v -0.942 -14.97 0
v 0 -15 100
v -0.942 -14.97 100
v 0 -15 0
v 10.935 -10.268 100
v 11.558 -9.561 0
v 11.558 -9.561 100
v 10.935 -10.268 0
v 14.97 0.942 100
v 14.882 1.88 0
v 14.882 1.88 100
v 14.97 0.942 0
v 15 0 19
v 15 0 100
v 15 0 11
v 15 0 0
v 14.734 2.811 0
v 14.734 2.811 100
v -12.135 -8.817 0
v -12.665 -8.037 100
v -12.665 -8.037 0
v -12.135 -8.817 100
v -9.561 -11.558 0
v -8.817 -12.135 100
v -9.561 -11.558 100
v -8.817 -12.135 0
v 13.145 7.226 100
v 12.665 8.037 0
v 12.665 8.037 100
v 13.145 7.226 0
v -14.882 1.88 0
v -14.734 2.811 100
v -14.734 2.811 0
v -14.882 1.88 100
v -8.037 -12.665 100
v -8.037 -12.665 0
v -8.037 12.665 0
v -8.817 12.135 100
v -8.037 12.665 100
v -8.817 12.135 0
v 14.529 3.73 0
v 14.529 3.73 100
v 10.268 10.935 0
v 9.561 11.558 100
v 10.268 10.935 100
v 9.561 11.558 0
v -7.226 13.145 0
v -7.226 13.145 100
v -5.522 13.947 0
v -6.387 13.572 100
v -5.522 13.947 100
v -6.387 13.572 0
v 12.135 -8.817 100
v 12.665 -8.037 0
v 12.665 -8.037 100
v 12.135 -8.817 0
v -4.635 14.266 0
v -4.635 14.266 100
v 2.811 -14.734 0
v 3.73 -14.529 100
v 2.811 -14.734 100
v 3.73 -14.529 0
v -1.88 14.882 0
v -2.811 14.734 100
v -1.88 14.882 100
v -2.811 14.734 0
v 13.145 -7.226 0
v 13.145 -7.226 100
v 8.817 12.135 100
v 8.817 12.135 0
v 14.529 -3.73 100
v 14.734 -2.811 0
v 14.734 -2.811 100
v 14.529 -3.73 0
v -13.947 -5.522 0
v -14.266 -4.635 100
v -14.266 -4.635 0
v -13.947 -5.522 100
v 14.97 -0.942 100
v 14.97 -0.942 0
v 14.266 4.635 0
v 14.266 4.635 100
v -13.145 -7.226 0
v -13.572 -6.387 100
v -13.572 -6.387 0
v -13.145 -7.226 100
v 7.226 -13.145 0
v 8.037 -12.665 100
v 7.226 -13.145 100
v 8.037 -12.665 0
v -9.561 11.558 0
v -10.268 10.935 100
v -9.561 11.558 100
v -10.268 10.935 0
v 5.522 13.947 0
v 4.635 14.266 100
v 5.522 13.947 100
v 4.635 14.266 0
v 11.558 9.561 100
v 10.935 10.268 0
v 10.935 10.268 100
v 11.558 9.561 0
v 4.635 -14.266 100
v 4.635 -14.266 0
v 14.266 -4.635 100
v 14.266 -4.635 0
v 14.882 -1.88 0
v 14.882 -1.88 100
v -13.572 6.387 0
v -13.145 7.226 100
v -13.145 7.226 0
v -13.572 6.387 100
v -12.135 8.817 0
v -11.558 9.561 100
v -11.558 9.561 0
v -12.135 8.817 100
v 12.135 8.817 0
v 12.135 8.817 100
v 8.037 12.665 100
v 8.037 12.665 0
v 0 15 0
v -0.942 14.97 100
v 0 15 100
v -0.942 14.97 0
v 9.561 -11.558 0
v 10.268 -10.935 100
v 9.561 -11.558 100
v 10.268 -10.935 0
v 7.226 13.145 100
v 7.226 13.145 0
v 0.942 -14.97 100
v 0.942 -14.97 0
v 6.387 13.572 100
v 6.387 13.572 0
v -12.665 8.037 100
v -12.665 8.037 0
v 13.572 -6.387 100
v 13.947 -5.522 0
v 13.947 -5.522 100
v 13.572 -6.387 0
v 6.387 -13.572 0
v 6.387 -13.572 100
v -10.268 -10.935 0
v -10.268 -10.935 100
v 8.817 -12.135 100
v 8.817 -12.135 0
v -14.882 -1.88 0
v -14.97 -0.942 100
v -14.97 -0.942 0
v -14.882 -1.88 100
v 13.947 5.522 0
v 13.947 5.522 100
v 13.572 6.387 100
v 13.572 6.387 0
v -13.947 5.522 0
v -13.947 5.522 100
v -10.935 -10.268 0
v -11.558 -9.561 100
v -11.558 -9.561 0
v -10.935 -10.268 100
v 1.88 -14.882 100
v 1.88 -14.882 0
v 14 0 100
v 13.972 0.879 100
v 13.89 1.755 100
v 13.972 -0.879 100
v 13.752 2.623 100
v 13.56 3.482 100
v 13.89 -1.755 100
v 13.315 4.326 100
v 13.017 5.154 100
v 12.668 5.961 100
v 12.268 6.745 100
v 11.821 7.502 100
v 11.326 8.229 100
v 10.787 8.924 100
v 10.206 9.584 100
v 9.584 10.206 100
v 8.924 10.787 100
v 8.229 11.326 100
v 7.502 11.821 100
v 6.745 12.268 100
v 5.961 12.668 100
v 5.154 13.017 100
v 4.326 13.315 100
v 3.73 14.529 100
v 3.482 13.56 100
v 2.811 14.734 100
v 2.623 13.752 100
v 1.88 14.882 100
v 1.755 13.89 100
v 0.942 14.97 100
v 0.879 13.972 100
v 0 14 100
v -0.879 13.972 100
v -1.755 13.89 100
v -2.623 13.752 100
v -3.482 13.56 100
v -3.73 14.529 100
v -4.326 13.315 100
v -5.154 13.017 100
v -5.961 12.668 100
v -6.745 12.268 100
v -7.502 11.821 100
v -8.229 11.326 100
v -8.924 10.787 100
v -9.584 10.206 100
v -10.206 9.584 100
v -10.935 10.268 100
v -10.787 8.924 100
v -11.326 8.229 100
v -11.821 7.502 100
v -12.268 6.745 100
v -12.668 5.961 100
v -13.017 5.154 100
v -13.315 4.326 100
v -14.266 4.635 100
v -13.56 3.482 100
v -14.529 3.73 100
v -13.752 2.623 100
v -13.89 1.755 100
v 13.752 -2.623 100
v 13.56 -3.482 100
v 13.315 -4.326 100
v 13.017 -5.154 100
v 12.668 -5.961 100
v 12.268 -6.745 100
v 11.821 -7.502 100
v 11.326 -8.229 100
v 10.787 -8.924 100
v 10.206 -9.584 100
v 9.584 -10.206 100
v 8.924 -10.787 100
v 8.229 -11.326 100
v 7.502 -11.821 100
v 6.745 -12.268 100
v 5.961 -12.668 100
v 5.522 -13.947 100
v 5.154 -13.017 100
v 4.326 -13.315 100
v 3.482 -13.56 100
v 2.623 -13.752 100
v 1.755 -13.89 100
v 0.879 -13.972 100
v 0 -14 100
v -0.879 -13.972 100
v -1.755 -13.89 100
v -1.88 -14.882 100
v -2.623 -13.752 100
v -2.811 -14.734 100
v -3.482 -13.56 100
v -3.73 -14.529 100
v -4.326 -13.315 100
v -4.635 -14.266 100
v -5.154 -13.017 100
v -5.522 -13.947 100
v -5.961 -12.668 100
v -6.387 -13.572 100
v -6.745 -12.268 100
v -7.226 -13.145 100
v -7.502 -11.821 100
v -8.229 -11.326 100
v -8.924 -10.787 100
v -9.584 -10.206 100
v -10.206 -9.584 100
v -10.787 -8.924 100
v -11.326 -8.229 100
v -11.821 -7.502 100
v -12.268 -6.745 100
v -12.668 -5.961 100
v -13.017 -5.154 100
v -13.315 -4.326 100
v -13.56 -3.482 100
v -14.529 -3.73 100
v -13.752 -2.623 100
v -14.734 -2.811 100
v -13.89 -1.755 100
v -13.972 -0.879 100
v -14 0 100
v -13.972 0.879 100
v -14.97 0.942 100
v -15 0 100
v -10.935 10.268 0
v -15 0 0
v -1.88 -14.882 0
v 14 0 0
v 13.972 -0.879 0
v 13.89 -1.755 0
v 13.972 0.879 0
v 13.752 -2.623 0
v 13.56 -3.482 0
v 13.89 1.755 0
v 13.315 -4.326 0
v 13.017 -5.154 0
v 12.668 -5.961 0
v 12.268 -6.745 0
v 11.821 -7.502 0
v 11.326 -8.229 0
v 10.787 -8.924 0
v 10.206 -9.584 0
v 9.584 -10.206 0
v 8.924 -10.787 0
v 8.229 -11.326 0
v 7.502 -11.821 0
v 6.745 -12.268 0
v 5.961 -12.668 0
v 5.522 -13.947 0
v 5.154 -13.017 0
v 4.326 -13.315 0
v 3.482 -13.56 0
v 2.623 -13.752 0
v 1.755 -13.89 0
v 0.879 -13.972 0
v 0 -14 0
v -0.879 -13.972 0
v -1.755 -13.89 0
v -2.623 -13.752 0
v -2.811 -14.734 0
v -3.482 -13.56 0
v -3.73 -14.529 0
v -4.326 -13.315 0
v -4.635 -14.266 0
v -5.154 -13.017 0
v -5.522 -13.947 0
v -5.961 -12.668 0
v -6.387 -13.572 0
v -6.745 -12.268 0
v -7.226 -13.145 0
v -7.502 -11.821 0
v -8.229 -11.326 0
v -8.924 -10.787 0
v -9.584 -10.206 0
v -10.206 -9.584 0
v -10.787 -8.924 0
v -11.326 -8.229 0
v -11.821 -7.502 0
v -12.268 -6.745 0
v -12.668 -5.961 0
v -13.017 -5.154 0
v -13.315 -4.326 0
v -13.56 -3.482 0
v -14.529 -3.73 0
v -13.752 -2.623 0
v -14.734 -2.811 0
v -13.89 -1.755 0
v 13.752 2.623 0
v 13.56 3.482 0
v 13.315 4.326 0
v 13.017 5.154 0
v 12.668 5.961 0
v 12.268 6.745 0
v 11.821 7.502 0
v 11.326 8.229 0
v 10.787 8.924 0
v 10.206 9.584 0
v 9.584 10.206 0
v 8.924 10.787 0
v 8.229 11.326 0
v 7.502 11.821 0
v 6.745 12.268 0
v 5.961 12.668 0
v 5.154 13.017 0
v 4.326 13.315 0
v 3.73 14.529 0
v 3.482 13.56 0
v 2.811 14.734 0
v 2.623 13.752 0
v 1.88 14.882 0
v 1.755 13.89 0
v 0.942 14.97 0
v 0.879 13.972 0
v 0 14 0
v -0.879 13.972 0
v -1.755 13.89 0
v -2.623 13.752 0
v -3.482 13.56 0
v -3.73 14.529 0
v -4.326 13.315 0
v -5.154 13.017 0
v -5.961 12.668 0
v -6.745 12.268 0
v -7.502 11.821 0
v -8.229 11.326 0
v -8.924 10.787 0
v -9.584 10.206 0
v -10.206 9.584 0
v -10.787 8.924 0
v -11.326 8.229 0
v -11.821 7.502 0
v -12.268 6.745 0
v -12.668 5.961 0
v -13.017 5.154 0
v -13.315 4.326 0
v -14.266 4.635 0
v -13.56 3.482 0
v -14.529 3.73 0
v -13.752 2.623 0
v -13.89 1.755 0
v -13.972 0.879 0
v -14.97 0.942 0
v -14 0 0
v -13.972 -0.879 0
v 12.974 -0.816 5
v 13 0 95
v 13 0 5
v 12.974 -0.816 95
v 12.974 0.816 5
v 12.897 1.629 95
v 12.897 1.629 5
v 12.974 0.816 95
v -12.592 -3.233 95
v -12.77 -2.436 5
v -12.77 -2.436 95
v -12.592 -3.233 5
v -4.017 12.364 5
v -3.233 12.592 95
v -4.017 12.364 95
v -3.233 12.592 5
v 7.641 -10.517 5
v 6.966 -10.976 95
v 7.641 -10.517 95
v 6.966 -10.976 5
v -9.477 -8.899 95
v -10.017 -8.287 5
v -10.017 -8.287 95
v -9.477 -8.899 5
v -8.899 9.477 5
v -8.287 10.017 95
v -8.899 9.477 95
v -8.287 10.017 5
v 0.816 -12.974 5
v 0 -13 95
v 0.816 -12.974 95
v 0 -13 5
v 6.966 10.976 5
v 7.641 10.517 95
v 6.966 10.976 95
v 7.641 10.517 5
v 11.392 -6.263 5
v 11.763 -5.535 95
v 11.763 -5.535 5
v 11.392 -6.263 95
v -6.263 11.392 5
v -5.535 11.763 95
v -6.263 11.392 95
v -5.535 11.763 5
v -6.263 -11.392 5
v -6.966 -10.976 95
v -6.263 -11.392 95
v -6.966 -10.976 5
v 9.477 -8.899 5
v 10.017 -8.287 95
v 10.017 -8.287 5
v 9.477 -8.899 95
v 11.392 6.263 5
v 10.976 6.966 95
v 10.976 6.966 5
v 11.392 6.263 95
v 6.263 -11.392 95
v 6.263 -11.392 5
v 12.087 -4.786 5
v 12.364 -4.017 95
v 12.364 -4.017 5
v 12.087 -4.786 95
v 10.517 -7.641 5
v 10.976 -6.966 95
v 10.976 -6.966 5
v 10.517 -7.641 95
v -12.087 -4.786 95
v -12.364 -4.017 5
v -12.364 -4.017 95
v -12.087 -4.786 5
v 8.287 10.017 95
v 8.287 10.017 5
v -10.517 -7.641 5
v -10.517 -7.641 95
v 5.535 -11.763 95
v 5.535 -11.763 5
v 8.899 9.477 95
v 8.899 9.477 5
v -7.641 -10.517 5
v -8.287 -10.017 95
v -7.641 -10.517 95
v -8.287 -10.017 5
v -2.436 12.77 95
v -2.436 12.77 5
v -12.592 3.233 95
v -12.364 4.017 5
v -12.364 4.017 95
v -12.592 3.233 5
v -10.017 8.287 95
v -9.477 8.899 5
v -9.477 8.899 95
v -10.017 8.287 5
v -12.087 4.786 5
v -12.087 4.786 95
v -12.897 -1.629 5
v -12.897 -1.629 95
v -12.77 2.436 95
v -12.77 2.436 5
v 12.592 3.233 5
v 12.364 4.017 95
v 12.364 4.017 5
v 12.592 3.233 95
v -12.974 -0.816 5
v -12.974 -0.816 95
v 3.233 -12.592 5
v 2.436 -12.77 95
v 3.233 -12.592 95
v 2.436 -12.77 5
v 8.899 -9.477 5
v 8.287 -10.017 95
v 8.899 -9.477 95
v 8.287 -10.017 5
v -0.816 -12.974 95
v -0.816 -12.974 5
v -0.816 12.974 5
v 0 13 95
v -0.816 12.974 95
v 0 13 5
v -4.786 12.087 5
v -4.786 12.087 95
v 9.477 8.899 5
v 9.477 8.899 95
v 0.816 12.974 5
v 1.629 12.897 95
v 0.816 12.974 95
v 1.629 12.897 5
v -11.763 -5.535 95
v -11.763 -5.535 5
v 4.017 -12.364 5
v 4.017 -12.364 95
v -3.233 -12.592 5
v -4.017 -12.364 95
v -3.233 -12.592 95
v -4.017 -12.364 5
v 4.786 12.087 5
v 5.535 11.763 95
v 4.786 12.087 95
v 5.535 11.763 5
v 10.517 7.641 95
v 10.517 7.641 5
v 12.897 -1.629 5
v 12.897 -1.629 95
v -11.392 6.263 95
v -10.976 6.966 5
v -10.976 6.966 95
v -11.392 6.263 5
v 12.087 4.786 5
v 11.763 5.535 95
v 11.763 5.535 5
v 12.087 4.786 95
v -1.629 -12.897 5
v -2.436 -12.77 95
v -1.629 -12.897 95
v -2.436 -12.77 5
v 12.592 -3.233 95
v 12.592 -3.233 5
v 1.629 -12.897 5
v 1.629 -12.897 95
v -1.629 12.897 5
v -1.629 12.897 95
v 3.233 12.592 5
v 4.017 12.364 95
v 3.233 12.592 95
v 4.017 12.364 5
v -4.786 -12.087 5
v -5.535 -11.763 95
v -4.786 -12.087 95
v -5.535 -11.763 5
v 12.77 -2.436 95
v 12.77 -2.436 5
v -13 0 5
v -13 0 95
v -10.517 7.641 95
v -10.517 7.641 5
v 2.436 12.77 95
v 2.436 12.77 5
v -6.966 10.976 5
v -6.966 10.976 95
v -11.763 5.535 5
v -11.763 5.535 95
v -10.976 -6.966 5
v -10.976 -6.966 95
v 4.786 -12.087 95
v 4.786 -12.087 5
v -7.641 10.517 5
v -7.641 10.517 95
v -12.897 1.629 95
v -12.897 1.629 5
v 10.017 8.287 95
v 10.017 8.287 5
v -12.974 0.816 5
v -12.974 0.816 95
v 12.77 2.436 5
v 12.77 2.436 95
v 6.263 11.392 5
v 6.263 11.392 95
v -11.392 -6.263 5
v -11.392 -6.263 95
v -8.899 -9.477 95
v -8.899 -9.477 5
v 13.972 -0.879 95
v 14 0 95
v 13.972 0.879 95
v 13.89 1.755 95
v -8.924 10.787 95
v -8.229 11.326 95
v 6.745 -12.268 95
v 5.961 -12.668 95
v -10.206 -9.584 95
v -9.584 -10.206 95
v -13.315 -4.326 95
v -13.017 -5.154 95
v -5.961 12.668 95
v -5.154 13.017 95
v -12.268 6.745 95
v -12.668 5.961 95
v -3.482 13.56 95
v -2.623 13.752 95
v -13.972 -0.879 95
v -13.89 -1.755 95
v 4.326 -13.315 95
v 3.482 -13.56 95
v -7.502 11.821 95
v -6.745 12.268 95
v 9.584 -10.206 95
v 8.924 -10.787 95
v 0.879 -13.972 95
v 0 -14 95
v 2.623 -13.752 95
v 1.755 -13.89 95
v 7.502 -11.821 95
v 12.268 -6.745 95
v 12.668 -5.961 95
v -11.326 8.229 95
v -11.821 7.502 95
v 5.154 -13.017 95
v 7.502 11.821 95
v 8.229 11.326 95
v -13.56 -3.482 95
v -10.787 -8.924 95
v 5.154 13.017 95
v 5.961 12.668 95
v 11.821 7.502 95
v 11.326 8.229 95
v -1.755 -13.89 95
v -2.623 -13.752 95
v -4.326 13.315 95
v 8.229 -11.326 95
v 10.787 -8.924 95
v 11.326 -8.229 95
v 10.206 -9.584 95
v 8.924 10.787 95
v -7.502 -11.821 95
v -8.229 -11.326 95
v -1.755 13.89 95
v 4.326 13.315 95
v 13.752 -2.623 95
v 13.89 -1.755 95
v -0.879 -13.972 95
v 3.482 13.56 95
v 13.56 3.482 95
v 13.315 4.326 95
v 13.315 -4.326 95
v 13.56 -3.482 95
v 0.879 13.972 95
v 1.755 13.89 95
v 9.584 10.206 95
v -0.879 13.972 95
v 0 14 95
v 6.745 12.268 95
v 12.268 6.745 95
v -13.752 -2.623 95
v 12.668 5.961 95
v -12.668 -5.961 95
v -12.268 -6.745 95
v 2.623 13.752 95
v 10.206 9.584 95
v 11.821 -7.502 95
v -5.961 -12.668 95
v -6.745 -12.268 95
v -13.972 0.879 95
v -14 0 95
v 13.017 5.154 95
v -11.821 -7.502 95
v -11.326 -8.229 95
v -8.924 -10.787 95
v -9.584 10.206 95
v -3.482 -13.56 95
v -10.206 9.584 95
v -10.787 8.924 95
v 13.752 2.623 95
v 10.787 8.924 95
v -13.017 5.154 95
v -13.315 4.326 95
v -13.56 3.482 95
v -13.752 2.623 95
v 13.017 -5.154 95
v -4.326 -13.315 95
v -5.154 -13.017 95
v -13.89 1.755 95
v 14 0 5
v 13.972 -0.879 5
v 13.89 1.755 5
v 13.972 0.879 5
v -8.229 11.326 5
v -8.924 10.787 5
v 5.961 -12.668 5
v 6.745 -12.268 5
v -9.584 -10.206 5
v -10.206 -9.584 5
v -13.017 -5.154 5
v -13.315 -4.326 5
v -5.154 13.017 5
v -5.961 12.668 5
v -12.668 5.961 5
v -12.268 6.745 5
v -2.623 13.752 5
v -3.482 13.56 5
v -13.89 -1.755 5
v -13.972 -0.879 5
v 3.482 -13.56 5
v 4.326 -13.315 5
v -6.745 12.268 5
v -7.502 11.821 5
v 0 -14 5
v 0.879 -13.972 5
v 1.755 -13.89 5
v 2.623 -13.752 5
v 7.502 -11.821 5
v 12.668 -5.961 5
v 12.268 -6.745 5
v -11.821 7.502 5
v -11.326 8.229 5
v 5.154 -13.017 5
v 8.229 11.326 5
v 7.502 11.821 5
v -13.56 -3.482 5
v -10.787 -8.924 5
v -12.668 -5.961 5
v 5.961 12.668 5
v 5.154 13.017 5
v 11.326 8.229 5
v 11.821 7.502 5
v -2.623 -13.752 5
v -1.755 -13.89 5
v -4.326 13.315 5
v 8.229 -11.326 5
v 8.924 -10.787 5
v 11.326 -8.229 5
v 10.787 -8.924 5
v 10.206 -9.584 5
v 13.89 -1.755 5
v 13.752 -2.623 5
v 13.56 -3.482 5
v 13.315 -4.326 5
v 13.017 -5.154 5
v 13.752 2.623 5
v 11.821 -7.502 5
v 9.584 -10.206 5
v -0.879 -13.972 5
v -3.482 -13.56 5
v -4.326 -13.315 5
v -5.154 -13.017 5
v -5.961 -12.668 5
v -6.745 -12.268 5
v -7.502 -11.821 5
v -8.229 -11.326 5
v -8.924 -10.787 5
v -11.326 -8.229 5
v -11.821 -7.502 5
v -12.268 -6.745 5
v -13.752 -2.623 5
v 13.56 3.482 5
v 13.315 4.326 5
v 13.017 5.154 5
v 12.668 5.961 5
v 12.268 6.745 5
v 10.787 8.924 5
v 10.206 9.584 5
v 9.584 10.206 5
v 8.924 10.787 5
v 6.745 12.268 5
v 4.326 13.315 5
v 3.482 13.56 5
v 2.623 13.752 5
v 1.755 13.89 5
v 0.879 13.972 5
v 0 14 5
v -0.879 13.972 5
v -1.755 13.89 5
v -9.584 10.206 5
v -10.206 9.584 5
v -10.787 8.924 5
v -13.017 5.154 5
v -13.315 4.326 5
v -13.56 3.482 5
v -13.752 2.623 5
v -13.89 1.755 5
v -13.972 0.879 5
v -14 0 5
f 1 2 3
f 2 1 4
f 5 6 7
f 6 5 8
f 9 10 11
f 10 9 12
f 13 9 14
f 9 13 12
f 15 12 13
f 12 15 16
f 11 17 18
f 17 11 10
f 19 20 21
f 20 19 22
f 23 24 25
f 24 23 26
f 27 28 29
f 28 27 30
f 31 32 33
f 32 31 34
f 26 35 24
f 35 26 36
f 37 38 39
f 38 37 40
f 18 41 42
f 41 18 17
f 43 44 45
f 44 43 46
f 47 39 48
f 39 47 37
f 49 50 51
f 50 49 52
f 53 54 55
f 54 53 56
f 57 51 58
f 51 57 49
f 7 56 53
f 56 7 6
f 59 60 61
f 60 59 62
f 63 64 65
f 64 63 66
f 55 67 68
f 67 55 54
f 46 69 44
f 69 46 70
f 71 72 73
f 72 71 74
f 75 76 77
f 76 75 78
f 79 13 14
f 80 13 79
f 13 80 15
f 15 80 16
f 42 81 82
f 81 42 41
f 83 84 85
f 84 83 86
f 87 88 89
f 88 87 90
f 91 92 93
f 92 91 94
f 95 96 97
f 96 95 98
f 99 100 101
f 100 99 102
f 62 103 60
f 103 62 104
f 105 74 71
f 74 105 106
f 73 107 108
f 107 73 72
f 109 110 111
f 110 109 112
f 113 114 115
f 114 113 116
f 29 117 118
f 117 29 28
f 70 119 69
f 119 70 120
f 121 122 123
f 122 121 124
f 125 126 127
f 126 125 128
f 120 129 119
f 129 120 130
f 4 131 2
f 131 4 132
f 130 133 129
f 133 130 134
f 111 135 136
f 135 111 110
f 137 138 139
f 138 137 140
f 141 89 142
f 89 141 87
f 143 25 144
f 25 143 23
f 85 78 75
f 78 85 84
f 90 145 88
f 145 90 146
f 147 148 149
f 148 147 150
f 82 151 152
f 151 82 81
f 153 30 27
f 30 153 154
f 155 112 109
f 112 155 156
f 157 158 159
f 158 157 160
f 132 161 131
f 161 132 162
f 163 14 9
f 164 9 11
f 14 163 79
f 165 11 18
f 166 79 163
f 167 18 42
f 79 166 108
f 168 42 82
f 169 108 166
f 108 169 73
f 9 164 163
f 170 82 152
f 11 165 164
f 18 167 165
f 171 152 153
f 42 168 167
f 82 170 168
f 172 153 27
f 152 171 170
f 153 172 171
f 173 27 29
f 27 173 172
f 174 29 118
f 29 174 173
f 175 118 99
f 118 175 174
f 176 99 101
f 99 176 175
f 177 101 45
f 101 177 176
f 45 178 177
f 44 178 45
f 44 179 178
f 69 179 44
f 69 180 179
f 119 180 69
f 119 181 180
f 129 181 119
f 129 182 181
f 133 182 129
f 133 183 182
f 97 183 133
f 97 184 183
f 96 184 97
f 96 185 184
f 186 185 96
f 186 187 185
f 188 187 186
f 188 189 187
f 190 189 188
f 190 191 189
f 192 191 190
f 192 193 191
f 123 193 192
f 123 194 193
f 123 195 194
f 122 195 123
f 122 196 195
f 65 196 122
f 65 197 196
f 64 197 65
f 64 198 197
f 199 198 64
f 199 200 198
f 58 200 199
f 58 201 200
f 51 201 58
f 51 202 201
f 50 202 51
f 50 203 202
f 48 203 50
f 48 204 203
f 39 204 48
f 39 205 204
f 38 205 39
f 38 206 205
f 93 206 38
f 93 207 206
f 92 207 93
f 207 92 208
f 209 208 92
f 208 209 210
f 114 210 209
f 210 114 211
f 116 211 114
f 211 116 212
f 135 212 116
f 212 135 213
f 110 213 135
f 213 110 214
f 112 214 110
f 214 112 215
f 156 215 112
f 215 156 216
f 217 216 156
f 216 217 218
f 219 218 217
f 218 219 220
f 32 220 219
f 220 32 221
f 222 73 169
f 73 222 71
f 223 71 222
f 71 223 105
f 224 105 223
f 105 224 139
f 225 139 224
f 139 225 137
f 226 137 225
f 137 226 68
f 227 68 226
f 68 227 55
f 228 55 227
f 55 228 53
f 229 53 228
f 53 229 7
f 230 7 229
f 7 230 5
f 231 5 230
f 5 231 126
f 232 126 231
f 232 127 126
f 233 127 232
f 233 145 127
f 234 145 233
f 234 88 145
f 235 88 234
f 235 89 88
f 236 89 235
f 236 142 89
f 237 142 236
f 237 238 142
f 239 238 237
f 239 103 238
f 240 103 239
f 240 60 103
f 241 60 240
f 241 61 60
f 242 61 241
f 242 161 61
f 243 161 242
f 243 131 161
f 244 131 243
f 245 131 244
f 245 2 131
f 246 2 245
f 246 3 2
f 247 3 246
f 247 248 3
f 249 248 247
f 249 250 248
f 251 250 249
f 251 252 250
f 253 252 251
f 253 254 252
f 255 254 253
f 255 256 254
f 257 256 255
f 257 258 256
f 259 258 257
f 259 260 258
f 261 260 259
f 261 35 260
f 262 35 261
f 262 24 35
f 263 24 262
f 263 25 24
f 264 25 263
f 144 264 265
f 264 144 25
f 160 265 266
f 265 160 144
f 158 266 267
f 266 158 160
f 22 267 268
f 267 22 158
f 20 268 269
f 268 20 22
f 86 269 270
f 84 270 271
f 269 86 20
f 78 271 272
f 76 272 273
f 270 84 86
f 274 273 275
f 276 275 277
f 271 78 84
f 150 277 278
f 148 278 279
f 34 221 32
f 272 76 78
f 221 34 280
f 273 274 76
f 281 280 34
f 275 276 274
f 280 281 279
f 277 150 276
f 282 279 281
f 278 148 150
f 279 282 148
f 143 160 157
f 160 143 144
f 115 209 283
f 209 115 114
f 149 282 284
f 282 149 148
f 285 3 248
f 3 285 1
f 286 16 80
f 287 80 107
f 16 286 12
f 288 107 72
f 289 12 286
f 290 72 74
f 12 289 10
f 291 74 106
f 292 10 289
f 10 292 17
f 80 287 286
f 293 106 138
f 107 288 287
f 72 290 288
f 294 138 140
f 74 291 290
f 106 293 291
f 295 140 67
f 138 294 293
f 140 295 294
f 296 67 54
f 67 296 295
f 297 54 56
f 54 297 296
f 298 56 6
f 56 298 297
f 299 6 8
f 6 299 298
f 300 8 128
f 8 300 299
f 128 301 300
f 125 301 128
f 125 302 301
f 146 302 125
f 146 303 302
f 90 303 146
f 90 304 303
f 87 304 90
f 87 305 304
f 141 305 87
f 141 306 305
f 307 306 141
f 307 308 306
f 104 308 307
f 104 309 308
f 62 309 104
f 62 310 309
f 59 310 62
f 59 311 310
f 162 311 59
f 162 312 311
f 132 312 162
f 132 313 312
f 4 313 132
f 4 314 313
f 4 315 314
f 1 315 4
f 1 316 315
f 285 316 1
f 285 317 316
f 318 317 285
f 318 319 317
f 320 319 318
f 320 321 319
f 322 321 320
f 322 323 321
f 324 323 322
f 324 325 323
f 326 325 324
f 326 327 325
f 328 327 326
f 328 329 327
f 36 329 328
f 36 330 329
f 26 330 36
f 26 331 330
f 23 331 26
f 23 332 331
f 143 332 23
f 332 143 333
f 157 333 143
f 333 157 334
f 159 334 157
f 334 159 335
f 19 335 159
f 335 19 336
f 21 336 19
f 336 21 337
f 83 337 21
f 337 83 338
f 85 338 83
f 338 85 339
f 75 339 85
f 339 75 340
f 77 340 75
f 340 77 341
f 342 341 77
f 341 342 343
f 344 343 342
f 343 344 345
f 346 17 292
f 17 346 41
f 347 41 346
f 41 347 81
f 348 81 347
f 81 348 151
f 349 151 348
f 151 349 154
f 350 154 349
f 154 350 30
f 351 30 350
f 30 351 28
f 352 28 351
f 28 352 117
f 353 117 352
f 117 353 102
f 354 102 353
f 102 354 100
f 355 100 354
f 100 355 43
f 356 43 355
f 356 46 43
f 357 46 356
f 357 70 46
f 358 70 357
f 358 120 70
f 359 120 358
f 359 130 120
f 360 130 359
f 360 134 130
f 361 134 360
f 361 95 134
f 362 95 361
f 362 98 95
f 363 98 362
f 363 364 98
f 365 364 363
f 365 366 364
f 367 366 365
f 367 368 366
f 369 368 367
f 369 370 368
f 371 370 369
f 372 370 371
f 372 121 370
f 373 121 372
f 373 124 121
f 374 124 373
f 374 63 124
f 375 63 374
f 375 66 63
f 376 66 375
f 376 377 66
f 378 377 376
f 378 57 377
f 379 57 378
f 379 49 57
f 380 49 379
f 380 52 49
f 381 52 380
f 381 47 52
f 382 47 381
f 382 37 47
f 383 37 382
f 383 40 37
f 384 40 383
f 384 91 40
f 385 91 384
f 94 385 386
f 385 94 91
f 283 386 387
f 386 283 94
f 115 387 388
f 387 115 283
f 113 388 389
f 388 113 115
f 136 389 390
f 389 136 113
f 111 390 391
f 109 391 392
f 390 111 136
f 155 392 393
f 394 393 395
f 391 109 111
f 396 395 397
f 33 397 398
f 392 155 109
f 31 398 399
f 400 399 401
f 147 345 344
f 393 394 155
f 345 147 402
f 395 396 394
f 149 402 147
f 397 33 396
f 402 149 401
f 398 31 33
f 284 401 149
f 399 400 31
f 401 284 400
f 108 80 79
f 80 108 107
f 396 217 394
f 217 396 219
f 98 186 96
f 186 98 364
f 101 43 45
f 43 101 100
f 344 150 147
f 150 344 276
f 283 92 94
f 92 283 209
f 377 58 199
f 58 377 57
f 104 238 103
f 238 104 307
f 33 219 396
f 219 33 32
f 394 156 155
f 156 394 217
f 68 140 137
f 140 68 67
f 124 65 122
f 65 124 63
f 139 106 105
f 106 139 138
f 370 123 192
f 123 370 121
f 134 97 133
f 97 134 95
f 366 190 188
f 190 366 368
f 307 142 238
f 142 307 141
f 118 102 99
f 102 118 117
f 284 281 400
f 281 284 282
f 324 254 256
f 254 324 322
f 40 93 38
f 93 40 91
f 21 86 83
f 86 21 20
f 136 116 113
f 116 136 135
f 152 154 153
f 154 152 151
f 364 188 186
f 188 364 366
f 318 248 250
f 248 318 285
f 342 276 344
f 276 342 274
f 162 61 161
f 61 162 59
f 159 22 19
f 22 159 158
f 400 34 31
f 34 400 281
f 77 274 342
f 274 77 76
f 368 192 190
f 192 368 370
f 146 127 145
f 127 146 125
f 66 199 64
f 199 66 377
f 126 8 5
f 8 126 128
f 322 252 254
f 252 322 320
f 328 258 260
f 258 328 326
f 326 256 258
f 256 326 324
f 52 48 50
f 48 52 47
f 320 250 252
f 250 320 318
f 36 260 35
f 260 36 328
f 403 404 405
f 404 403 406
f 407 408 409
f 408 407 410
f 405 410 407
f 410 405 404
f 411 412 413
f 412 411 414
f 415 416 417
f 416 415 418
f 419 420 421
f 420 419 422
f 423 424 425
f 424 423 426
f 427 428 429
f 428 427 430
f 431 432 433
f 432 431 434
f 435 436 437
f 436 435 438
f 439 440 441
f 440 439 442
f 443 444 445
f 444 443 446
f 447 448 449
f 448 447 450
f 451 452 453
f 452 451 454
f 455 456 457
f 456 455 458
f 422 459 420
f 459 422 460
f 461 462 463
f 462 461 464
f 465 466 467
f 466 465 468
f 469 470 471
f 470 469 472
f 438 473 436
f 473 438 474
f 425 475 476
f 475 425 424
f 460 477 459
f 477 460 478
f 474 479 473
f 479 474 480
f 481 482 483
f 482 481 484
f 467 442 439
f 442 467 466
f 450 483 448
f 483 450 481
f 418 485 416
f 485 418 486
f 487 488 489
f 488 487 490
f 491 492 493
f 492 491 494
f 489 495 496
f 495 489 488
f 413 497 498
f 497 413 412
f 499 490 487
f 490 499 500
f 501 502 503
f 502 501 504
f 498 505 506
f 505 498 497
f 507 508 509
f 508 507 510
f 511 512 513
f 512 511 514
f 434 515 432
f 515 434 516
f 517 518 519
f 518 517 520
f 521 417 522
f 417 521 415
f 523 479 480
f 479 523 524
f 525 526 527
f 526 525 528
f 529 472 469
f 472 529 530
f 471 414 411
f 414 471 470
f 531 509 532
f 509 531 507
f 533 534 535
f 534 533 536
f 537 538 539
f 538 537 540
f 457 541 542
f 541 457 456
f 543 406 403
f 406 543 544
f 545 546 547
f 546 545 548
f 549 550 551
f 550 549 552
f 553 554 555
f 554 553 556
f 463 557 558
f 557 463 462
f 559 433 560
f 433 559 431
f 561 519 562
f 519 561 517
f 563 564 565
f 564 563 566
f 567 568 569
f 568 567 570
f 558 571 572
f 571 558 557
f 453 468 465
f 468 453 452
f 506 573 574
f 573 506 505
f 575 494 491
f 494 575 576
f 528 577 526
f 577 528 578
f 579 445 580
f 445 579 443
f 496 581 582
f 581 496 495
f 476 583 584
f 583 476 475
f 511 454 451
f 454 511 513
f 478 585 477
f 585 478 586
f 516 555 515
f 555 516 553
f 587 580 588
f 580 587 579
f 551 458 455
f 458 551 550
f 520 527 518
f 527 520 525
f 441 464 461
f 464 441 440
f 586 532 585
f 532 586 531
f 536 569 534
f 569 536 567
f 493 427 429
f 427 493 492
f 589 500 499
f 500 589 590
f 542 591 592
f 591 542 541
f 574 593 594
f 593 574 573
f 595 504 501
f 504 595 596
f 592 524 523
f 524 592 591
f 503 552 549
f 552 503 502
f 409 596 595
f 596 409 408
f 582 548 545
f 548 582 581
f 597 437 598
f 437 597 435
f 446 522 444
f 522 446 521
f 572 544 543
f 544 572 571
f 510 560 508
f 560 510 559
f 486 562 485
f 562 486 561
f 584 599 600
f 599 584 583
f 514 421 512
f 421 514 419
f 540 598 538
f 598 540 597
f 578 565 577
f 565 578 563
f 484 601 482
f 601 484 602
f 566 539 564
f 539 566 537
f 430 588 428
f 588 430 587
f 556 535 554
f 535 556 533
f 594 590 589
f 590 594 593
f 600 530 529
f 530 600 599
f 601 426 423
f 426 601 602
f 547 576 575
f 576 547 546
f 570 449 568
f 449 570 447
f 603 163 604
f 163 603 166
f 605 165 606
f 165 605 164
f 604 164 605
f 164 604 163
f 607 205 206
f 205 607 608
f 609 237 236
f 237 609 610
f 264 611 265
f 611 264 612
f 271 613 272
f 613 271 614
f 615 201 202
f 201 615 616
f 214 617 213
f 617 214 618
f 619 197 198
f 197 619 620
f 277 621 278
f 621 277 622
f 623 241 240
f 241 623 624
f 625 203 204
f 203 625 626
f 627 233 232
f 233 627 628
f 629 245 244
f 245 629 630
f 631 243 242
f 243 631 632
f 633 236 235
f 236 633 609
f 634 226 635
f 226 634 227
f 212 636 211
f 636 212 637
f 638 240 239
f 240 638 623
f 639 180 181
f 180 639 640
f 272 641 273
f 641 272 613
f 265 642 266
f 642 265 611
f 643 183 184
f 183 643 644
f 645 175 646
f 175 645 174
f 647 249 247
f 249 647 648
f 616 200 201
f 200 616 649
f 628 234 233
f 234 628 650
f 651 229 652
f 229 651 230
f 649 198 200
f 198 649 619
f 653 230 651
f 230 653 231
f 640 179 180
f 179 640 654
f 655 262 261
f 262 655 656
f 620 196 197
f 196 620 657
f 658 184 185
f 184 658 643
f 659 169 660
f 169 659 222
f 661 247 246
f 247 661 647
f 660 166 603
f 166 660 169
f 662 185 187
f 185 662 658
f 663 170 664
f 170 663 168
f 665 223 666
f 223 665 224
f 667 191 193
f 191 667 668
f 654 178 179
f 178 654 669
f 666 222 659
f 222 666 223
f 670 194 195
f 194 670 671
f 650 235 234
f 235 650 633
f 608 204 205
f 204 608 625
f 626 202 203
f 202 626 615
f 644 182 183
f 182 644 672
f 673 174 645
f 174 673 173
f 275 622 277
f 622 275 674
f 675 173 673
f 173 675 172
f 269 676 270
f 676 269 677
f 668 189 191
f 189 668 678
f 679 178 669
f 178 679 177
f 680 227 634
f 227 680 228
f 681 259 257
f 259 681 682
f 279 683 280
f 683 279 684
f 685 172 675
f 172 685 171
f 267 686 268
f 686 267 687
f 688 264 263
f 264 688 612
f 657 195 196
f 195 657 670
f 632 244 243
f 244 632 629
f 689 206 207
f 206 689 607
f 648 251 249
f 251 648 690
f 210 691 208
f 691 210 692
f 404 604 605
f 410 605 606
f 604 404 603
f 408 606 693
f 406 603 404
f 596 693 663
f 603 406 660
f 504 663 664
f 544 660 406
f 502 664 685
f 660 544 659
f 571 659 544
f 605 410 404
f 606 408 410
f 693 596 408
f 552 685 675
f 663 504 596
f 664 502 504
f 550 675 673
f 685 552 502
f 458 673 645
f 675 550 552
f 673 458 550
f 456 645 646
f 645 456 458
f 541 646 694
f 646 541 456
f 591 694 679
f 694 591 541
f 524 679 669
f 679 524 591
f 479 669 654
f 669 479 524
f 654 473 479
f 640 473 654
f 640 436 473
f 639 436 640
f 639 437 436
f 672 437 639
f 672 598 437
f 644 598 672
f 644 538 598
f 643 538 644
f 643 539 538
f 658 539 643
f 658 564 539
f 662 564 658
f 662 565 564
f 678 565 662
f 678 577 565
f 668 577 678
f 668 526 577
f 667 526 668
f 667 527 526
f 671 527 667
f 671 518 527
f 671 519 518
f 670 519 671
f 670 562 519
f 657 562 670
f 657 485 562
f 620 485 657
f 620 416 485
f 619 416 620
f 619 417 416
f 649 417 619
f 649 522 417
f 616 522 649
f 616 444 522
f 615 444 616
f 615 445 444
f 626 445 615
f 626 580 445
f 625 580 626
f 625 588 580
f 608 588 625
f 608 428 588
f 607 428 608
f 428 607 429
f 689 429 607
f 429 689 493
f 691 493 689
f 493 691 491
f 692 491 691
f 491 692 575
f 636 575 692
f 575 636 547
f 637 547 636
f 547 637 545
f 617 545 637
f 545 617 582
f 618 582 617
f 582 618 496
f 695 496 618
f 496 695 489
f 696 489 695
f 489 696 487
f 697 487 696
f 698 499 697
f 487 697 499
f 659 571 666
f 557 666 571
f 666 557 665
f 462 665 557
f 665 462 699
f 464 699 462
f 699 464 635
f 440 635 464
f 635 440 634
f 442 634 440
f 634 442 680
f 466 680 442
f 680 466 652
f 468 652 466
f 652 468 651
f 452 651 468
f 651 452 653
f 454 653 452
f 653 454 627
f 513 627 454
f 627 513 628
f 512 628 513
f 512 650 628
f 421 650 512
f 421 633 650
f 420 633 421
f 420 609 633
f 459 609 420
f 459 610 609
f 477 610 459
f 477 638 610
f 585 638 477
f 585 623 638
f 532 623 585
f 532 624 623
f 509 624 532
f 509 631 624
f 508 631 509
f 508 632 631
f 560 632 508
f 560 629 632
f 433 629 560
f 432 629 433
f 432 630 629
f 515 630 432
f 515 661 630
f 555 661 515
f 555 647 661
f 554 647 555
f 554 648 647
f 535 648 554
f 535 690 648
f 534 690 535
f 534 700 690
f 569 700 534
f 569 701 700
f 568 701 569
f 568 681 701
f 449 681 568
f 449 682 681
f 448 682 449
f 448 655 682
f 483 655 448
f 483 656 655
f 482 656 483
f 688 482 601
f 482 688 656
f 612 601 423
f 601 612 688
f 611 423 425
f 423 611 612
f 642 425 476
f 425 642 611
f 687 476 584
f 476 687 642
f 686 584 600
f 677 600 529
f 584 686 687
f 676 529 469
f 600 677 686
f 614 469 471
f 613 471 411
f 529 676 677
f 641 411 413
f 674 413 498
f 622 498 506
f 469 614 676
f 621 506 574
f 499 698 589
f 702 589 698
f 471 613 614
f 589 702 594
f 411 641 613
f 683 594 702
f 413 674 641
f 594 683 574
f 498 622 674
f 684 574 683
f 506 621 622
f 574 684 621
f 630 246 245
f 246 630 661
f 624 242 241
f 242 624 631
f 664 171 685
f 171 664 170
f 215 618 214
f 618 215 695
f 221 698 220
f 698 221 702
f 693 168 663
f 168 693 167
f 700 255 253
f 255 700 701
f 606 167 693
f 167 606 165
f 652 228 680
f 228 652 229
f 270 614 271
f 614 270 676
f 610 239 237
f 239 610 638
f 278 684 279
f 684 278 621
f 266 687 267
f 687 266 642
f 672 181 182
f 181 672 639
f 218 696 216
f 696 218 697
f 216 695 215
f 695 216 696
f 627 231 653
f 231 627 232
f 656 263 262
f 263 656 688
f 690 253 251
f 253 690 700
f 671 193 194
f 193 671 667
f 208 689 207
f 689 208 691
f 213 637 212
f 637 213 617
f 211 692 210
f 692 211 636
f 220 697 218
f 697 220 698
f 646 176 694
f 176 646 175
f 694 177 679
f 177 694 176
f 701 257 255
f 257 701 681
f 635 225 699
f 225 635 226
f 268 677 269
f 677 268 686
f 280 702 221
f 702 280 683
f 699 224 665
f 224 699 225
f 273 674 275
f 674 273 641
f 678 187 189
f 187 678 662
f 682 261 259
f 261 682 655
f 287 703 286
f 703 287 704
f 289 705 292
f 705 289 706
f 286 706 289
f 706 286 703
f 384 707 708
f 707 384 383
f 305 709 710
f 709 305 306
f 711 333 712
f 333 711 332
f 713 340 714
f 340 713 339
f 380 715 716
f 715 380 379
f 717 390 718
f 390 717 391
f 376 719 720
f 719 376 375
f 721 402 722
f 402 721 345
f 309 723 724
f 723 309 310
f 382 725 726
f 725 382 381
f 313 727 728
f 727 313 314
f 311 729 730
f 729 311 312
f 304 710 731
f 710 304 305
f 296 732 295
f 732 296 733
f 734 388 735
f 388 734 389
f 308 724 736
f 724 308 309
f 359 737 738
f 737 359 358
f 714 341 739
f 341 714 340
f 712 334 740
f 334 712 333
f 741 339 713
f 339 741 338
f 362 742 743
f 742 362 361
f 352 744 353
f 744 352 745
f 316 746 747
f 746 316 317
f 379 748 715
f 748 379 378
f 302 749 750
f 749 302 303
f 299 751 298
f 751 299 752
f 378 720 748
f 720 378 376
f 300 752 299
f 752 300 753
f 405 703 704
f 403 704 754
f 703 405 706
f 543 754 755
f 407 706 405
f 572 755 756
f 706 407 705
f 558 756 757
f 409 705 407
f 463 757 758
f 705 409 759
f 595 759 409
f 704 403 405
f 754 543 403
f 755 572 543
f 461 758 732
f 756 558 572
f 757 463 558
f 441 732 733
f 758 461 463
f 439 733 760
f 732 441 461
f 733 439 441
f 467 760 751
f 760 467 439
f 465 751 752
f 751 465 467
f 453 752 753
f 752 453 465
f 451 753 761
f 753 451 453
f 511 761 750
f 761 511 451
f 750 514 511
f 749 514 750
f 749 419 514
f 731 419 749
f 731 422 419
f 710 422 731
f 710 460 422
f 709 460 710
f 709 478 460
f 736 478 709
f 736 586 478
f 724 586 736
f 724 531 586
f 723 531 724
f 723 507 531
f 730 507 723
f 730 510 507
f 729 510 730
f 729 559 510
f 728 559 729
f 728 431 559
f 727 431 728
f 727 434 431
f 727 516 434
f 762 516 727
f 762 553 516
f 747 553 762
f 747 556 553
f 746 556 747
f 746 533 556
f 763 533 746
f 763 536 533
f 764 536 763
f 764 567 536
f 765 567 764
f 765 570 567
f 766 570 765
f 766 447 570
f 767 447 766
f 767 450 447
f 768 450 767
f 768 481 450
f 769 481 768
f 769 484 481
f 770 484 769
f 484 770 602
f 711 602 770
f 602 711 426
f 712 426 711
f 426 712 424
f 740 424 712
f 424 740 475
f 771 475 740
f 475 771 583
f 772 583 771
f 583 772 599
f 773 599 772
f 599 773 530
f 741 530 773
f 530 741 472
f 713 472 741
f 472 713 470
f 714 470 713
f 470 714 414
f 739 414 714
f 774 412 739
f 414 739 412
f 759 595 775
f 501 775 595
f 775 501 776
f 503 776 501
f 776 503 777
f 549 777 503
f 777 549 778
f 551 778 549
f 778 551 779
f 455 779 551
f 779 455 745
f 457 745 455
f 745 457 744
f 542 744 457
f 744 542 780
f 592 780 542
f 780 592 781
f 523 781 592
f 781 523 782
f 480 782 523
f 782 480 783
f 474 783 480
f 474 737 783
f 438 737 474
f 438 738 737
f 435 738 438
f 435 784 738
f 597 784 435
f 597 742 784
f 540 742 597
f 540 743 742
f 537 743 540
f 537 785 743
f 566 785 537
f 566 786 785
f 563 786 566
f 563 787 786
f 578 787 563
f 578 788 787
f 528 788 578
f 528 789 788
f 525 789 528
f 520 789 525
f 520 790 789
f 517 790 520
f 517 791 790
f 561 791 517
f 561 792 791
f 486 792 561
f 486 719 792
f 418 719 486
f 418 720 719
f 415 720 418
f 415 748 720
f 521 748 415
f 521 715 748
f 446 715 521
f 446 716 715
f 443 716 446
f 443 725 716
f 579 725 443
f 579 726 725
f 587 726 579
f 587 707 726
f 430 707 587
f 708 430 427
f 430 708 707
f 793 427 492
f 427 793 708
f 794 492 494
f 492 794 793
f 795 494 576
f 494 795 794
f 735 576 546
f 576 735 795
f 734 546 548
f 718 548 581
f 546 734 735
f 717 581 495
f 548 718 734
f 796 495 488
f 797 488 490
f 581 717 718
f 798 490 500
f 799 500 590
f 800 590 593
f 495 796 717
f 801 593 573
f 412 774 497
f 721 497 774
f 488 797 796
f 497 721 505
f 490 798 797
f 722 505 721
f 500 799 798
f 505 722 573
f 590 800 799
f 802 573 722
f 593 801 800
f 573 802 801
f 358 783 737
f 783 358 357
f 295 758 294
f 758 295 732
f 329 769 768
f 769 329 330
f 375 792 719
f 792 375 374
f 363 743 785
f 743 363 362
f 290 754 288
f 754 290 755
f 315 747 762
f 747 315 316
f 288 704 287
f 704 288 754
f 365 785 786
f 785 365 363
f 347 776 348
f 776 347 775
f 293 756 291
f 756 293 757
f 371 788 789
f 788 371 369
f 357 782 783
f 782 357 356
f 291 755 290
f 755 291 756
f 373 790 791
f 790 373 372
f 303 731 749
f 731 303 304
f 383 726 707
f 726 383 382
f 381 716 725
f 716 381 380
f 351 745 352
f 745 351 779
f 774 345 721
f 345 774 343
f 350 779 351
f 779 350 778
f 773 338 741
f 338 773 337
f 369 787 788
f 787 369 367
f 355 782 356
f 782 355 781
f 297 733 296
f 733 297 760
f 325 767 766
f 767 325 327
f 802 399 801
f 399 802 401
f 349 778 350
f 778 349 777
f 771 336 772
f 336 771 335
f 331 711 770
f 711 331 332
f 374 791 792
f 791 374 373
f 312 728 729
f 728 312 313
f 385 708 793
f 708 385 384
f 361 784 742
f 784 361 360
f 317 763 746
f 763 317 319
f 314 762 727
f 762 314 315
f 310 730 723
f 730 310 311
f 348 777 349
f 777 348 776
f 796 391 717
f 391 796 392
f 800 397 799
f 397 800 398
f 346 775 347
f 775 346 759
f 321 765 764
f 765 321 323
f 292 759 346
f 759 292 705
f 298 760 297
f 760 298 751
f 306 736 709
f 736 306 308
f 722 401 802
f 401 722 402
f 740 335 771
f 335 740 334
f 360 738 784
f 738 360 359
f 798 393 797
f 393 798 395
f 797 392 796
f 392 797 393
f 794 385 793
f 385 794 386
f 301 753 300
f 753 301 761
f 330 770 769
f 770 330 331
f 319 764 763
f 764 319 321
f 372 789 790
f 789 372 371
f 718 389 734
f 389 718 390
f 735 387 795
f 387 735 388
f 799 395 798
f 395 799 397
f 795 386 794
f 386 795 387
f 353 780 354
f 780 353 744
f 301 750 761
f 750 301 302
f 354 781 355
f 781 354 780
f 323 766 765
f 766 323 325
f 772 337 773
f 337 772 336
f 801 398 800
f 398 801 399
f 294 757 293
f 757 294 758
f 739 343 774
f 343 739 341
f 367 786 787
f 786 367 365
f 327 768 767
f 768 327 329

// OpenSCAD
/*
 * HIRT Probe Head - Dummy/Test Version
 * 
 * Simplified probe head for fit testing and prototyping
 * 
 * This is a simplified version without threads for quick testing
 * Use for:
 * - Fit testing with electronics
 * - Coil placement testing
 * - Size verification
 * - Prototype assembly
 */

// Parameters (same as full version)
probe_head_od = 30;
probe_head_length = 100;
wall_thickness = 2;
cable_gland_dia = 8;
cable_gland_height = 15;

// Calculated
probe_head_id = probe_head_od - 2 * wall_thickness;

// Simplified body (no threads, open top and bottom)
module dummy_probe_head() {
    difference() {
        // Outer cylinder
        cylinder(h = probe_head_length, d = probe_head_od, $fn = 100);
        
        // Inner cavity
        translate([0, 0, -0.5])
            cylinder(h = probe_head_length + 1, d = probe_head_id, $fn = 100);
        
        // Cable gland hole
        translate([probe_head_od/2, 0, cable_gland_height])
            rotate([0, 90, 0])
                cylinder(h = wall_thickness + 1, d = cable_gland_dia, $fn = 50);
        
        // Top opening (for easy access)
        translate([0, 0, probe_head_length - 5])
            cylinder(h = 6, d = probe_head_id + 2, $fn = 100);
        
        // Bottom opening (for coil insertion)
        translate([0, 0, -1])
            cylinder(h = 6, d = probe_head_id + 2, $fn = 100);
    }
}

// Export
dummy_probe_head();
